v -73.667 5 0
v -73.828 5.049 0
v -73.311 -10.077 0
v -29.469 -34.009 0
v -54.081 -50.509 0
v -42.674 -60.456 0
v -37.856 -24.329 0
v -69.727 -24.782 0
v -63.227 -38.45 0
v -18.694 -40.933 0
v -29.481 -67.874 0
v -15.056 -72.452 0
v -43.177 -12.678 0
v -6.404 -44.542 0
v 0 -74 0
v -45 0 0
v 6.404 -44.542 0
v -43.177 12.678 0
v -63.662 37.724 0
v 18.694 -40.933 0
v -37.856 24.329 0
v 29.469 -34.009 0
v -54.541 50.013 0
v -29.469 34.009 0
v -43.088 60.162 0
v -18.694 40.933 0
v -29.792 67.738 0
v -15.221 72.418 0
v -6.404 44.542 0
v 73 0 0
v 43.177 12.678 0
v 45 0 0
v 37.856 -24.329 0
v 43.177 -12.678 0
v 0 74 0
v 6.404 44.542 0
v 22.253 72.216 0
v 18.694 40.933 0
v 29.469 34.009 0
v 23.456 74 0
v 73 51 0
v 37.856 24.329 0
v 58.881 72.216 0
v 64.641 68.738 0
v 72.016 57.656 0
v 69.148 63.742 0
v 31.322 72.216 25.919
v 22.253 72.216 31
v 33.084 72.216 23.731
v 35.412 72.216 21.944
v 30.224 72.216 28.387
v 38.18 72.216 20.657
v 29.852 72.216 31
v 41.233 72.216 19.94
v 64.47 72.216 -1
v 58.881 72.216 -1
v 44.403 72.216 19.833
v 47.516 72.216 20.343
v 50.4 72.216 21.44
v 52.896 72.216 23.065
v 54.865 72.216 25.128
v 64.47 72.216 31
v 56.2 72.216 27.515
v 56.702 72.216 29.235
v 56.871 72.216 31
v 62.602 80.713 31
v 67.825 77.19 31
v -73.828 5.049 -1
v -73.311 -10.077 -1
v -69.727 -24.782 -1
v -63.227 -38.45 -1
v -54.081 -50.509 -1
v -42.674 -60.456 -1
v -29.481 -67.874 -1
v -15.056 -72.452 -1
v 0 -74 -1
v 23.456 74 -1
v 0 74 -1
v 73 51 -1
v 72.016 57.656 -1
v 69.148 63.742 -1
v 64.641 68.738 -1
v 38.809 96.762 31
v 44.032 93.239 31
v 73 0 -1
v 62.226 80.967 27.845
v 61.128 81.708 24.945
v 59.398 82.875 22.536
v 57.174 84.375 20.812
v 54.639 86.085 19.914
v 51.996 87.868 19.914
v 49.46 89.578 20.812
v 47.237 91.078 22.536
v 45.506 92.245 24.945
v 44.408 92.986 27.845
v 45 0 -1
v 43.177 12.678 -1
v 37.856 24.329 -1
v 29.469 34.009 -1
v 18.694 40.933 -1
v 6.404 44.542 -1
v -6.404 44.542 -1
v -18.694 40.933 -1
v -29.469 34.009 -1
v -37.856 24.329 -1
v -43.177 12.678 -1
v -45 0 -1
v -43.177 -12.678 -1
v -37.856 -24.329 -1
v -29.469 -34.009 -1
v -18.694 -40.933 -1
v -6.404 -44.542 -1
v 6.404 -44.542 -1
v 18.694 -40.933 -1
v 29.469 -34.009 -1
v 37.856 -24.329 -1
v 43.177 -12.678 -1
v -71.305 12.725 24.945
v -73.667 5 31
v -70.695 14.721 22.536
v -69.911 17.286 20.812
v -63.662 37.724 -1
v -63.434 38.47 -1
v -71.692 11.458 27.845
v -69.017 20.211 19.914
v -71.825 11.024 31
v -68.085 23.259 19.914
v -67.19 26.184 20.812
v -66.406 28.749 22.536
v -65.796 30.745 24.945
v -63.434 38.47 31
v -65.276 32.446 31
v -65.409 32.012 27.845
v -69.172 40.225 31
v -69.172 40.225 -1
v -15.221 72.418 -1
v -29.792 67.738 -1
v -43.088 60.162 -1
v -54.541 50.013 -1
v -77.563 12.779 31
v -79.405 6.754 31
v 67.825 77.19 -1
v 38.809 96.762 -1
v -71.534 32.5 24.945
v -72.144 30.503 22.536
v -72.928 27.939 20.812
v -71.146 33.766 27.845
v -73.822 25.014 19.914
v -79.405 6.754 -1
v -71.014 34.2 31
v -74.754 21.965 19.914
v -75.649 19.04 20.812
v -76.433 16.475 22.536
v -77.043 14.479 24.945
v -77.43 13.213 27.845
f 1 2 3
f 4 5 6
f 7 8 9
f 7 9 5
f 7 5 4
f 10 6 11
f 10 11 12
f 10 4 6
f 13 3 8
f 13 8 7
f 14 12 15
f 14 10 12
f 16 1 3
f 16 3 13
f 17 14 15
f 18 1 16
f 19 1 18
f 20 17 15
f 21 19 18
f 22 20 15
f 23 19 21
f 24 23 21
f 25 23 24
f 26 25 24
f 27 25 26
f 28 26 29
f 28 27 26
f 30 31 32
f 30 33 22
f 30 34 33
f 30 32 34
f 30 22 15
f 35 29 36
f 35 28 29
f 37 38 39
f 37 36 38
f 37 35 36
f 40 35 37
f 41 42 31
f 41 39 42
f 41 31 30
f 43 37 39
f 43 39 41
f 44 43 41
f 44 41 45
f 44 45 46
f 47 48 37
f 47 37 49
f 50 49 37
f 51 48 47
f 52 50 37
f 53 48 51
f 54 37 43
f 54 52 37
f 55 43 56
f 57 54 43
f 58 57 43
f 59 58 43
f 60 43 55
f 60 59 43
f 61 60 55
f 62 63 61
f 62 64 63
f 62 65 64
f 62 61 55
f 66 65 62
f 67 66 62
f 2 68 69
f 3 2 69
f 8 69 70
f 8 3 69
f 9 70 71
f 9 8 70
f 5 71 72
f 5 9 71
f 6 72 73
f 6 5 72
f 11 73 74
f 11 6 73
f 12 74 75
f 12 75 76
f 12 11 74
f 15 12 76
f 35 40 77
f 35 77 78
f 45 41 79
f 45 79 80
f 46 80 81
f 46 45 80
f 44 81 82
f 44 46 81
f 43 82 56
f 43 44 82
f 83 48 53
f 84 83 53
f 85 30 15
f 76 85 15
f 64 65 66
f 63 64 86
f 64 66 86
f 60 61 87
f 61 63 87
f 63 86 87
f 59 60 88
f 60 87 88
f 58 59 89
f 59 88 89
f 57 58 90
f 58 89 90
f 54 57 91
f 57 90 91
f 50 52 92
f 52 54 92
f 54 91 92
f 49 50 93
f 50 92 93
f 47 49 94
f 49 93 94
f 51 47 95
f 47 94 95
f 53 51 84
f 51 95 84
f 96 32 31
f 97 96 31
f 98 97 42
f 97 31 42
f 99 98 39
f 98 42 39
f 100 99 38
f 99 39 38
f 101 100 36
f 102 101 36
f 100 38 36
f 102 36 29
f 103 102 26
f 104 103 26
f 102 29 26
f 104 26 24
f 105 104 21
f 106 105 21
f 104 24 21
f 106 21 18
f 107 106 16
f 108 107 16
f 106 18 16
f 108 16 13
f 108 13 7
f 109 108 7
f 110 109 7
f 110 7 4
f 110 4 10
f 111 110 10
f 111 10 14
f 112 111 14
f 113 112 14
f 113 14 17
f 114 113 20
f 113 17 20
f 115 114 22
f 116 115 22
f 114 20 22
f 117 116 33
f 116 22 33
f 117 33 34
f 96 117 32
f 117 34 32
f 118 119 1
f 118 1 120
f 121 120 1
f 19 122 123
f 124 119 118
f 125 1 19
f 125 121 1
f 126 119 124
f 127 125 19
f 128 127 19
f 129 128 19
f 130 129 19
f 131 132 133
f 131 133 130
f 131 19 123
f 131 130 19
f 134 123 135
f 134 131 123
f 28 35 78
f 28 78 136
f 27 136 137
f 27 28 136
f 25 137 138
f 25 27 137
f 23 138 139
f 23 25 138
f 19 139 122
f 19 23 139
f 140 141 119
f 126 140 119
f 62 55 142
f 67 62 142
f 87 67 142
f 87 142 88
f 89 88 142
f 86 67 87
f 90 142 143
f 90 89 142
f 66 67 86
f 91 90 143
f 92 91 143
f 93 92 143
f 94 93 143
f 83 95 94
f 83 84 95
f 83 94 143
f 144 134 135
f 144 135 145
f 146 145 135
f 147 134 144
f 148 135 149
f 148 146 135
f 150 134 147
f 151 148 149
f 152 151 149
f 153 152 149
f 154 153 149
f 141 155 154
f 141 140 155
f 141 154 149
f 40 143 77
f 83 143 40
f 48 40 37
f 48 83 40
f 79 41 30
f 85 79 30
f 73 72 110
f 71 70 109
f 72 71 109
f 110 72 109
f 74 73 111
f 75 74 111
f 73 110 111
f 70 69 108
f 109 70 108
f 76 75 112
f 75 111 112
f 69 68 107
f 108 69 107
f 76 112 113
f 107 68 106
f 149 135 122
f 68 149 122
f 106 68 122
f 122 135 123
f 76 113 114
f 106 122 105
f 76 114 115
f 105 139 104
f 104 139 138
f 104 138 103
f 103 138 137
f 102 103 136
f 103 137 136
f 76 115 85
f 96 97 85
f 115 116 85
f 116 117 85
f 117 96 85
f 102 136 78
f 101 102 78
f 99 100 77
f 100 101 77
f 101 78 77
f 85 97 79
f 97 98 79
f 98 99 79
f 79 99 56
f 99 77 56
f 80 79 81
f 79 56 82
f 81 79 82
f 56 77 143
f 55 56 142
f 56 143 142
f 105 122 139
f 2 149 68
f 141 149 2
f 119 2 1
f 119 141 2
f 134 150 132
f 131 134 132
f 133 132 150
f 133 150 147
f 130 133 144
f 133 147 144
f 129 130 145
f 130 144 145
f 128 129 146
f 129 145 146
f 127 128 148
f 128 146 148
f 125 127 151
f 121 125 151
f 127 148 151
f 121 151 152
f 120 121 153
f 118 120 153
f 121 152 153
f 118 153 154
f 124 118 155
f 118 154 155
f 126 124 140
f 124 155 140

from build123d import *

# Parameters (mm, degrees)
SKETCH001_R       = 45
PAD_DEPTH         = 1
PAD003_DEPTH      = 31
PAD003_DEPTH_BACK = 1
PAD004_DEPTH      = 31
PAD004_DEPTH_BACK = 1
SKETCH026_R       = 11.2
POCKET_DEPTH      = 169.3567157682
SKETCH027_R       = 11.2
POCKET001_DEPTH   = 207.6737429392


with BuildPart() as part:
    # Sketch001 → Pad (new body)
    with BuildSketch(Plane.XY):
        with BuildLine():
            Line((50, 74), (0, 74))
            ThreePointArc((0, 74), (-74.0000001202, 0), (0, -74))
            Line((73, 0), (0, -74))
            Line((73, 51), (73, 0))
            ThreePointArc((73, 51), (66.2634559673, 67.2634559673), (50, 74))
        make_face()
        Circle(SKETCH001_R, mode=Mode.SUBTRACT)
    extrude(amount=-PAD_DEPTH)

    # Sketch → Pad003 (new body, two sides)
    with BuildSketch(Plane.XY) as pad003_sk:
        Polygon((22.252644507, 72.2162499408), (64.4702727046, 72.2162499408), (67.8254301255, 77.1904753762), (38.809115086, 96.7622269976), align=None)
    extrude(amount=PAD003_DEPTH)
    extrude(pad003_sk.sketch, amount=-PAD003_DEPTH_BACK)

    # Sketch025 → Pad004 (new body, two sides)
    with BuildSketch(Plane.XY) as pad004_sk:
        Polygon((-69.1718947306, 40.2246535265), (-79.4049043959, 6.7539870678), (-73.6670758601, 4.9997568394), (-63.4340661948, 38.4704232981), align=None)
    extrude(amount=PAD004_DEPTH)
    extrude(pad004_sk.sketch, amount=-PAD004_DEPTH_BACK)

    # Sketch026 → Pocket (cut, through all)
    with BuildSketch(Plane(origin=(-74.5056676119, 22.7786685315, 0), x_dir=(-0.2923717047, -0.956304756, 0), z_dir=(-0.956304756, 0.2923717047, 0))):
        with Locations((-0.743122693, 31)):
            Circle(SKETCH026_R)
    extrude(amount=-POCKET_DEPTH, mode=Mode.SUBTRACT)

    # Sketch027 → Pocket001 (cut, through all)
    with BuildSketch(Plane(origin=(56.9936696471, 84.4965900712, 0), x_dir=(-0.8290375726, 0.5591929035, 0), z_dir=(0.5591929035, 0.8290375726, 0))):
        with Locations((4.4345360972, 31)):
            Circle(SKETCH027_R)
    extrude(amount=-POCKET001_DEPTH, mode=Mode.SUBTRACT)


solid = part.part
